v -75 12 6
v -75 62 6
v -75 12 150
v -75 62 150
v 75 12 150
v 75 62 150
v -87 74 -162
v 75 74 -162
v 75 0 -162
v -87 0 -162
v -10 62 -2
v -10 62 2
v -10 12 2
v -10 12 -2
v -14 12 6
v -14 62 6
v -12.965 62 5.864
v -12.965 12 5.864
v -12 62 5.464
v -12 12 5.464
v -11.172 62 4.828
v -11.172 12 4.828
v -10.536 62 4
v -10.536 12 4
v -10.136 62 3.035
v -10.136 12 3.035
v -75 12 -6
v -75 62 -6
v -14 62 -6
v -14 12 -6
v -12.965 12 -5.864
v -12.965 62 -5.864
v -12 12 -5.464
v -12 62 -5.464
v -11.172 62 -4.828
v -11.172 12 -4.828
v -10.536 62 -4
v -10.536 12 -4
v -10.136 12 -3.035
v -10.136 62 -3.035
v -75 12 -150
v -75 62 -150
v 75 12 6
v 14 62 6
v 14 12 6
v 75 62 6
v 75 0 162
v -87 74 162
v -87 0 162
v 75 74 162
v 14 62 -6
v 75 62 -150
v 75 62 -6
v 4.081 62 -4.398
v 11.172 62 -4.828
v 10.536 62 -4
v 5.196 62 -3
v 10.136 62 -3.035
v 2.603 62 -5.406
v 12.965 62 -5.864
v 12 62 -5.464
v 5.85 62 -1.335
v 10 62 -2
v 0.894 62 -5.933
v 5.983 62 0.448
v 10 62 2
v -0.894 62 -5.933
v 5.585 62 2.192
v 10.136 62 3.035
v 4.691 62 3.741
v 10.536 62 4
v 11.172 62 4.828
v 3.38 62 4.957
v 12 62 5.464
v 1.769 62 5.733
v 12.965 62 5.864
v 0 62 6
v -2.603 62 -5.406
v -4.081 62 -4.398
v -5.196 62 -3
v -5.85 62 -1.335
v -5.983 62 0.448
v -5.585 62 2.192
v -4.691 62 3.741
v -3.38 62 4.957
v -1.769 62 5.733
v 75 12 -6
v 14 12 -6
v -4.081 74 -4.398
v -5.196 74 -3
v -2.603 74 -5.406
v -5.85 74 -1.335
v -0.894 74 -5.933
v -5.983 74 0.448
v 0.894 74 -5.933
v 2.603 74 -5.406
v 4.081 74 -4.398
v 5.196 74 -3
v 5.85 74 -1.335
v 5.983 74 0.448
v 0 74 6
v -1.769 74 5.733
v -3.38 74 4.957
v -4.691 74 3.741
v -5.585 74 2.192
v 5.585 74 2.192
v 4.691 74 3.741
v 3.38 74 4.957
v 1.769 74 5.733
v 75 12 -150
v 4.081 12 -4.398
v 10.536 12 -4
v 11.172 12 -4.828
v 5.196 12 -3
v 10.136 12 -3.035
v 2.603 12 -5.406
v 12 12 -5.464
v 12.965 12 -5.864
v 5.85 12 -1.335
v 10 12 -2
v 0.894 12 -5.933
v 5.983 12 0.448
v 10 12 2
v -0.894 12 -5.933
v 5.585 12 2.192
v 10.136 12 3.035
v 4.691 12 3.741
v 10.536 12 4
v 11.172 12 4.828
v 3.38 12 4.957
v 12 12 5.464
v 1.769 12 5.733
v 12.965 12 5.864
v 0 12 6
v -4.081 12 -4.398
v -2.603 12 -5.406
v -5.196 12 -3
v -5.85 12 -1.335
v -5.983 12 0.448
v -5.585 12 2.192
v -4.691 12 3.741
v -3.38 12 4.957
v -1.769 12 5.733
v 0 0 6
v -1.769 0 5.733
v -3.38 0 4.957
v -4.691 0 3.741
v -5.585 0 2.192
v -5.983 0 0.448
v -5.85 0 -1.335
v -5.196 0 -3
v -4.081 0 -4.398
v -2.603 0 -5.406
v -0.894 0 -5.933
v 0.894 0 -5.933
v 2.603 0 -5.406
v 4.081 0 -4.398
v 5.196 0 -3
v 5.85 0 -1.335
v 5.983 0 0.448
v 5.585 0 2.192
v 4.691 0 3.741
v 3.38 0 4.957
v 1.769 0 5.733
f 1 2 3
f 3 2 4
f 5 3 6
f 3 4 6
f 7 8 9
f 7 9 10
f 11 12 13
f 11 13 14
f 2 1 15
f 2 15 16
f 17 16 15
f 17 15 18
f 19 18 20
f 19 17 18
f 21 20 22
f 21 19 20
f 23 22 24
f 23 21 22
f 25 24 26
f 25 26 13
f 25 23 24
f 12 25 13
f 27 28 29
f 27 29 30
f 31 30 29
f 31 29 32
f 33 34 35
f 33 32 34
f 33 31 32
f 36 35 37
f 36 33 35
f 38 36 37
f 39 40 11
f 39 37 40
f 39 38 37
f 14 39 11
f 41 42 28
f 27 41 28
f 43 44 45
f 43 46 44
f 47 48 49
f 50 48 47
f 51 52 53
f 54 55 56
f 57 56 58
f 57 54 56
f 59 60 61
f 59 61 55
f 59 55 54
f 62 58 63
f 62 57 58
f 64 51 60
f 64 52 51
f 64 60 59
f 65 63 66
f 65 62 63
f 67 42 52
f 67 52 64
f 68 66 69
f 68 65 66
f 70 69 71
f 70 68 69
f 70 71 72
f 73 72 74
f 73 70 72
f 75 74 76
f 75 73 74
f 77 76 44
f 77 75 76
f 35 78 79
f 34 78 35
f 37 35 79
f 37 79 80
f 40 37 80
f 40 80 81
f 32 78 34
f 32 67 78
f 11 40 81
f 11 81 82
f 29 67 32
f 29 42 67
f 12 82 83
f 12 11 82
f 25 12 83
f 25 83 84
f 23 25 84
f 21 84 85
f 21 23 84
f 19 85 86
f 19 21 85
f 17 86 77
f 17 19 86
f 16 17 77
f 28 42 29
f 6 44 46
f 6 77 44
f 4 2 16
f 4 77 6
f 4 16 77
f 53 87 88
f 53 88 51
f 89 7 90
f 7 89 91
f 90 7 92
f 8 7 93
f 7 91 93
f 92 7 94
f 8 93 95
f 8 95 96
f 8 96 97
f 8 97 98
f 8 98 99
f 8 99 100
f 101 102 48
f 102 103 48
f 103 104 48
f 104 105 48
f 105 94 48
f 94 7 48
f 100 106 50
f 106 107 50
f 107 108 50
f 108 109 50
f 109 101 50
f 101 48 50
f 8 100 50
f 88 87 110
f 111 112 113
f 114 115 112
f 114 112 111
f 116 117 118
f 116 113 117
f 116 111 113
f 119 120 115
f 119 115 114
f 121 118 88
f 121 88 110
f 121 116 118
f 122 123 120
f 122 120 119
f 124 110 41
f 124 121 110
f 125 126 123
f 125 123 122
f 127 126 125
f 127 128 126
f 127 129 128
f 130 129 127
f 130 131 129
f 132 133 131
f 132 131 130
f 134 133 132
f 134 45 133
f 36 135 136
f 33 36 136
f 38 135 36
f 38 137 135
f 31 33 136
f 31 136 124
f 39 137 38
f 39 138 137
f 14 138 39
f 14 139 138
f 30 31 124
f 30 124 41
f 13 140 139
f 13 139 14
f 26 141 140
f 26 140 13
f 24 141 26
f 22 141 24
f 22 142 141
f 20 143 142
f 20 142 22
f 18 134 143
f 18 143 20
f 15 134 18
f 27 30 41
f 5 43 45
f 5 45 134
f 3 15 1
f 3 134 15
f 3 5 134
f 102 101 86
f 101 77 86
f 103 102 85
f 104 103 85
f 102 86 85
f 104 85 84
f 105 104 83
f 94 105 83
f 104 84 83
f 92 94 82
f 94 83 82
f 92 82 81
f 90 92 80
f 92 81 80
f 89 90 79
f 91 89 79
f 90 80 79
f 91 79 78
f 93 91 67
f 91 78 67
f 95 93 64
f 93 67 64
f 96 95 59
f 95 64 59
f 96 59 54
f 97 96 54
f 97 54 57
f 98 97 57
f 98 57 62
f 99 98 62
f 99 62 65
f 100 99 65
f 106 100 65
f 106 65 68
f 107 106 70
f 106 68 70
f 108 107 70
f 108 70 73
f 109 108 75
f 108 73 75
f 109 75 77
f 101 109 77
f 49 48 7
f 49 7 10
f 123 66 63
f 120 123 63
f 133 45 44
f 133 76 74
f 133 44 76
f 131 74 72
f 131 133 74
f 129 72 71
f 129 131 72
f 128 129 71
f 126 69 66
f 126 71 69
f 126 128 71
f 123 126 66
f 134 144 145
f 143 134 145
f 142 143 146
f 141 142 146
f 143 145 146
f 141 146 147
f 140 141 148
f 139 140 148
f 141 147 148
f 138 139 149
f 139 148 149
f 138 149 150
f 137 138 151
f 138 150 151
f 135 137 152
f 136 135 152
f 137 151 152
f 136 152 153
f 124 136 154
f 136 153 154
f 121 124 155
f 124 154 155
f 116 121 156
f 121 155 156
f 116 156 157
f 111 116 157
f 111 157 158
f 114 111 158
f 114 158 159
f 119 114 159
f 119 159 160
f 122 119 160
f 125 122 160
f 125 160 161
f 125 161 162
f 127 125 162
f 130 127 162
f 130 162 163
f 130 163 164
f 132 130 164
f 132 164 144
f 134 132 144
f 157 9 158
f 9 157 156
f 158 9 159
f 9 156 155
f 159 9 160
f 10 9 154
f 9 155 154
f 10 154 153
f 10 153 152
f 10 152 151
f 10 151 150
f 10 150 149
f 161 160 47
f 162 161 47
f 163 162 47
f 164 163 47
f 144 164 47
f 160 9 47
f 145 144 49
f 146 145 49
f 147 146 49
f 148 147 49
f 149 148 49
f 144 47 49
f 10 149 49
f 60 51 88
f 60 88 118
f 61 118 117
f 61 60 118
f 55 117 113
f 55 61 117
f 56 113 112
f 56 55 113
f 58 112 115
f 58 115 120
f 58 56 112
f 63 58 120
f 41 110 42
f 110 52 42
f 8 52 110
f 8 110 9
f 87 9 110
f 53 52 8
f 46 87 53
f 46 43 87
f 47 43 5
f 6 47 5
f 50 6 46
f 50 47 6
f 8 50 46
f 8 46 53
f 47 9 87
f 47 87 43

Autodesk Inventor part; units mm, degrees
ref_plane "YZ Plane" through (0, 0, 0) normal (1, 0, 0) x (0, 1, 0)
ref_plane "XZ Plane" through (0, 0, 0) normal (0, 1, 0) x (-1, 0, 0)
ref_plane "XY Plane" through (0, 0, 0) normal (0, 0, 1) x (1, 0, 0)
sketch "Skizze2" plane through (0, 0, 0) normal (0, 1, 0) x (-1, 0, 0)
  line L0 (75, 150) -> (-75, 150)
  line L1 (-75, 150) -> (-75, -150)
  line L2 (-75, -150) -> (75, -150)
  line L3 (75, -150) -> (75, 150)
  point P0 (0, 0)
  dimension "d4" = 150
  dimension "d5" = 300
  dimension "d6" = 150
  dimension "d7" = 75
extrude "Extrusion2" add sketch "Skizze2" along normal blind 12
sketch "Skizze3" plane through (-75, 0, -150) normal (-1, 0, 0) x (0, 0, 1)
  line L0 (300, 0) -> (0, 0) projected
  line L1 (0, 0) -> (300, 0)
  line L2 (300, 0) -> (300, 74)
  line L3 (300, 74) -> (0, 74)
  line L4 (0, 74) -> (0, 0)
  point P0 (150, 0)
  dimension "d10" = 300
  dimension "d11" = 74
extrude "Extrusion3" add sketch "Skizze3" along normal blind 12
sketch "Skizze4" plane through (-75, 0, -150) normal (1, 0, 0) x (0, 0, -1)
  line L0 (-300, 12) -> (-300, 74) projected
  line L1 (-300, 74) -> (0, 74)
  line L2 (0, 74) -> (0, 62)
  line L3 (0, 62) -> (-300, 62)
  line L4 (-300, 62) -> (-300, 74)
  point P0 (-150, 0)
  dimension "d14" = 300
  dimension "d15" = 12
extrude "Extrusion4" add sketch "Skizze4" along normal blind 150
sketch "Skizze5" plane through (75, 0, 150) normal (0, 0, 1) x (1, 0, 0)
  line L0 (0, 0) -> (-162, 0) projected
  line L1 (0, 62) -> (0, 74) projected
  line L2 (-162, 0) -> (0, 0)
  line L3 (0, 0) -> (0, 74)
  line L4 (0, 74) -> (-162, 74)
  line L5 (-162, 74) -> (-162, 0)
  point P0 (-75, 0)
extrude "Extrusion5" add sketch "Skizze5" along normal blind 12
sketch "Skizze6" plane through (75, 0, -150) normal (0, 0, -1) x (-1, 0, 0)
  line L0 (0, 0) -> (0, 12) projected
  line L1 (162, 74) -> (162, 0) projected
  line L2 (0, 0) -> (162, 0)
  line L3 (162, 0) -> (162, 74)
  line L4 (162, 74) -> (0, 74)
  line L5 (0, 74) -> (0, 0)
  point P0 (75, 0)
  point P1 (162, 0)
extrude "Extrusion6" add sketch "Skizze6" along normal blind 12
sketch "Skizze7" plane through (-87, 74, 162) normal (0, 1, 0) x (1, 0, 0)
  point P0 (87, 162)
hole "Bohrung1" at (0, 74, 0) direction (0, -1, 0) diameter 12 end through all
sketch "Skizze8" plane through (-75, 0, -150) normal (1, 0, 0) x (0, 0, -1)
  line L0 (0, 62) -> (-300, 62) projected
  line L1 (0, 12) -> (-300, 12) projected
  line L2 (-156, 62) -> (-144, 62)
  line L3 (-144, 62) -> (-144, 12)
  line L4 (-144, 12) -> (-156, 12)
  line L5 (-156, 12) -> (-156, 62)
  line L6 (0, 62) -> (0, 12) projected
  point P0 (-150, 0)
  dimension "d29" = 12
  dimension "d30" = 144
extrude "Extrusion7" add sketch "Skizze8" along normal blind 65 contours L3 L1 L5 L0
sketch "Skizze9" plane through (-10, 0, -150) normal (1, 0, 0) x (0, 0, -1)
  point P0 (-150, 0)
fillet "Rundung1" radius 4 2 edges at (-10, 37, 6) (-10, 37, -6)
sketch "Skizze11" plane through (75, 0, 162) normal (1, 0, 0) x (0, 0, -1)
  line L0 (12, 12) -> (312, 12) projected
  line L1 (156, 12) -> (168, 12)
  line L2 (168, 12) -> (168, 62)
  line L3 (168, 62) -> (156, 62)
  line L4 (156, 62) -> (156, 12)
  line L5 (156, 12) -> (156, 62) projected
  point P0 (162, 0)
  dimension "d36" = 12
  dimension "d37" = 50
  dimension "d38" = 0
extrude "Extrusion9" add sketch "Skizze11" against normal blind 65
fillet "Rundung2" radius 4 2 edges at (10, 37, 6) (10, 37, -6)
sketch "Skizze12" plane through (75, 0, 162) normal (1, 0, 0) x (0, 0, -1)
  line L0 (324, 74) -> (0, 74) projected
  line L1 (0, 74) -> (324, 74)
  line L2 (324, 74) -> (324, 0)
  line L3 (324, 0) -> (0, 0)
  line L4 (0, 0) -> (0, 74)
  point P0 (162, 0)
extrude "Extrusion10" [suppressed]
properties part number "Lenkung"
